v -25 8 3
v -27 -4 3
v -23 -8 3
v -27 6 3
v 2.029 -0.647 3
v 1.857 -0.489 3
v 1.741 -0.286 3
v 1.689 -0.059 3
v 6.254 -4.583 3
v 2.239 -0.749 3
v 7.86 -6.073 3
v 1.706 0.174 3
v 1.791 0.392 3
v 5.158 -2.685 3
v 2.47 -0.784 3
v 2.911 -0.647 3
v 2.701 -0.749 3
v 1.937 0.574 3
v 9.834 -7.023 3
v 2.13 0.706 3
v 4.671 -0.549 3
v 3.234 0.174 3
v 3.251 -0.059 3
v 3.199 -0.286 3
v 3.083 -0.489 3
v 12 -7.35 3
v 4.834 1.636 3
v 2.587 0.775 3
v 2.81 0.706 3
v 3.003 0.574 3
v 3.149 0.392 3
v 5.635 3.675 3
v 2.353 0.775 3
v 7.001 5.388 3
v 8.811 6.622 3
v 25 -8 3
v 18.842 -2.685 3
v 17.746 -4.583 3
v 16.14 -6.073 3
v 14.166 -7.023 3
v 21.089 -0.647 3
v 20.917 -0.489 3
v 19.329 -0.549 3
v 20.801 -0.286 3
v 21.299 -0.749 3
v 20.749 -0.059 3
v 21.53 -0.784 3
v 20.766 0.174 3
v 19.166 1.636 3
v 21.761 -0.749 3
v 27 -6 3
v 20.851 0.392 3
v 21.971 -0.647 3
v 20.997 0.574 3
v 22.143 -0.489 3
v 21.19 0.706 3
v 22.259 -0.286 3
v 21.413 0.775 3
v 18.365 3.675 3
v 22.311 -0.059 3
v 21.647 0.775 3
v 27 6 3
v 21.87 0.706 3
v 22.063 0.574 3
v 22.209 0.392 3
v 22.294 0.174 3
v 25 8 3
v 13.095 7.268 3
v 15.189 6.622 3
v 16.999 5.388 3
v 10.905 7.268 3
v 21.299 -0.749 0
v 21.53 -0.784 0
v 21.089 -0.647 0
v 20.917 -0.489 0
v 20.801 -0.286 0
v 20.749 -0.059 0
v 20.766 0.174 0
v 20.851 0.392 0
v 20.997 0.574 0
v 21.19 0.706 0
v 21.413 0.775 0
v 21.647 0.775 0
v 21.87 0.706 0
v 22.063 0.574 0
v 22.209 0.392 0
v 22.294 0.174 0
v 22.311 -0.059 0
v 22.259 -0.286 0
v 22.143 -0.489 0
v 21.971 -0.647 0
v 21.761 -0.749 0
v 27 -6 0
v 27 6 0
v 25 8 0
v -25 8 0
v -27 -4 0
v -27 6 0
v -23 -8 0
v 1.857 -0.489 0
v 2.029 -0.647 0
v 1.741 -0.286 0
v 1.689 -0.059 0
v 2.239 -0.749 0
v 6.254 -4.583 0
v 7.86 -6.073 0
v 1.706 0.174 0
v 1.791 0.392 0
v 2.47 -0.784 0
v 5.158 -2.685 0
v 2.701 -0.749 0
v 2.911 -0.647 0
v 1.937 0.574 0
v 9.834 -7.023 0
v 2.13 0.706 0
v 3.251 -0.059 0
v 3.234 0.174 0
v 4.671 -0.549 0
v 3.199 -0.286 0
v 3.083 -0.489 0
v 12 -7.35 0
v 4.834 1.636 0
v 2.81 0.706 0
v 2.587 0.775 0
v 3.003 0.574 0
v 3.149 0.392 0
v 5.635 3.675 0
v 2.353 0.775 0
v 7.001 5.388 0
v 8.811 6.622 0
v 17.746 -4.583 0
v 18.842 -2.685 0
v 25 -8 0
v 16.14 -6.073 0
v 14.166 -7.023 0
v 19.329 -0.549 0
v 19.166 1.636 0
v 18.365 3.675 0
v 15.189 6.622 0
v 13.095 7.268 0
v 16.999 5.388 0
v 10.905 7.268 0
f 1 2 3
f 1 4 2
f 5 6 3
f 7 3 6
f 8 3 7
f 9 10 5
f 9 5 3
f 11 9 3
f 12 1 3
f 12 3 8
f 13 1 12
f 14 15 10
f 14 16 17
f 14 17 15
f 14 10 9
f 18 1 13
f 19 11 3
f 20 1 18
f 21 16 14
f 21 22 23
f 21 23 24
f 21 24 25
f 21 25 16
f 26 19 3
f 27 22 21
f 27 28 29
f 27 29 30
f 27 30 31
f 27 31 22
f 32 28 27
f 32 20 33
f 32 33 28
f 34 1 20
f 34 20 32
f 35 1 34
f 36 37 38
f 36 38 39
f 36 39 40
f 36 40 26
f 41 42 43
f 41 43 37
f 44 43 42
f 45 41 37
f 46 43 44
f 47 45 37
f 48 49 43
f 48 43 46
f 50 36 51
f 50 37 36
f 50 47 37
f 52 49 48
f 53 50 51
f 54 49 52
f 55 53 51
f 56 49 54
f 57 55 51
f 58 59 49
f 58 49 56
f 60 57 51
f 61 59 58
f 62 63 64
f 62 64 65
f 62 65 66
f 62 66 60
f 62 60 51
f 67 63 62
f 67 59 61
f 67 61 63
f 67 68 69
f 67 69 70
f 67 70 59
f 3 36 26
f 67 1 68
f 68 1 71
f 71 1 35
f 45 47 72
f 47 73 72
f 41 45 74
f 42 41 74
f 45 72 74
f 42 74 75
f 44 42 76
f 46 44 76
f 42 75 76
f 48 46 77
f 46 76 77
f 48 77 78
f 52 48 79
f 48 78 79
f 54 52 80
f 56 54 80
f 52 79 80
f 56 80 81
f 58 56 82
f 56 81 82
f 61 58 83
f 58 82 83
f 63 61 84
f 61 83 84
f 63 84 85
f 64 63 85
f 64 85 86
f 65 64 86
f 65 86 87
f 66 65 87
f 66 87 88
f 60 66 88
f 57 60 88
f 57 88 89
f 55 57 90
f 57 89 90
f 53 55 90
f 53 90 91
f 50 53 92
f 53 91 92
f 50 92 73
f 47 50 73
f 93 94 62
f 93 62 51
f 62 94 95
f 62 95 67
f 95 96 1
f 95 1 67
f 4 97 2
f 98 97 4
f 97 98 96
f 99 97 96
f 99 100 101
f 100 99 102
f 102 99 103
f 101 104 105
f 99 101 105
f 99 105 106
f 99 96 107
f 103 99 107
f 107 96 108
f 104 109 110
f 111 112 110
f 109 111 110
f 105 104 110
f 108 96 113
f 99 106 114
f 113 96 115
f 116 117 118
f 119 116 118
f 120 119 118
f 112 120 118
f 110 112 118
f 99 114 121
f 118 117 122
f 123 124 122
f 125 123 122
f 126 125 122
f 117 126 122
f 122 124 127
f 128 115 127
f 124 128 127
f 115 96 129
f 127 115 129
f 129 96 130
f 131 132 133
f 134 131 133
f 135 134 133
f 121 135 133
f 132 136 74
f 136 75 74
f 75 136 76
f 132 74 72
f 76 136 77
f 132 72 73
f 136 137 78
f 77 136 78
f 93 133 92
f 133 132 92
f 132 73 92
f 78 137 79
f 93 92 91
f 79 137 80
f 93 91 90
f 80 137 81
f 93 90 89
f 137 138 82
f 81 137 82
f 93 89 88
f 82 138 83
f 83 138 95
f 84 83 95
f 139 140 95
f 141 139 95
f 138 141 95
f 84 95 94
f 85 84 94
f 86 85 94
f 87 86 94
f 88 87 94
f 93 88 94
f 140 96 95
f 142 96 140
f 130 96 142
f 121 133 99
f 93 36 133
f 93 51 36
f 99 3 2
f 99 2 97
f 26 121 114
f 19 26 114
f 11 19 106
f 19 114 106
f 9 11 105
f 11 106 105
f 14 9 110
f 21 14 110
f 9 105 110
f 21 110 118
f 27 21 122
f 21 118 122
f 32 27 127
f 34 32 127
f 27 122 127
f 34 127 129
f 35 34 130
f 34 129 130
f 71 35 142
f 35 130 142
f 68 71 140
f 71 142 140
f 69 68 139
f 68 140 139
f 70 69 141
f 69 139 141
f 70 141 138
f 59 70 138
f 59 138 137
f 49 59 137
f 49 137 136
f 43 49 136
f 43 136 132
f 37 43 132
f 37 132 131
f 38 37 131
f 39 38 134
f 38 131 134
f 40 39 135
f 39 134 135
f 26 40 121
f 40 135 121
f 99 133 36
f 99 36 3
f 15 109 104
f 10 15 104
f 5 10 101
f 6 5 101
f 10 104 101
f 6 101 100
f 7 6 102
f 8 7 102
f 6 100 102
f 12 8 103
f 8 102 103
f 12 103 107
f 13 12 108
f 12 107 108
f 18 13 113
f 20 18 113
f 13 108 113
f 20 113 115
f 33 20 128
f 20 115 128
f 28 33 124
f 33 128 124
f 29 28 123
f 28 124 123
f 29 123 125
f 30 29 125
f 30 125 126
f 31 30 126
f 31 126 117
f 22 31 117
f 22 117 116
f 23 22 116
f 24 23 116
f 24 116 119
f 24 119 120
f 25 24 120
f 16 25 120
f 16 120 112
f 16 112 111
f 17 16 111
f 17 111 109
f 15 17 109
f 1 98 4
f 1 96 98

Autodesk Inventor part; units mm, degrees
ref_plane "YZ Plane" through (0, 0, 0) normal (1, 0, 0) x (0, 1, 0)
ref_plane "XZ Plane" through (0, 0, 0) normal (0, 1, 0) x (-1, 0, 0)
ref_plane "XY Plane" through (0, 0, 0) normal (0, 0, 1) x (1, 0, 0)
sketch "Sketch1" plane through (0, 0, 0) normal (0, 0, 1) x (1, 0, 0)
  line L0 (-37.8, 0) -> (37.8, 0) projected
  line L1 (0, -11.2) -> (0, 11.2) projected
  line L2 (-27, 8) -> (27, 8)
  line L3 (27, 8) -> (27, -8)
  line L4 (27, -8) -> (-27, -8)
  line L5 (-27, -8) -> (-27, 8)
  point P0 (0, 0)
  point P1 (0, 8)
  point P2 (27, 0)
  dimension "d0" = 54
  dimension "d1" = 16
extrude "Extrusion1" add sketch "Sketch1" along normal blind 3
sketch "Sketch2" plane through (0, 0, 3) normal (0, 0, 1) x (1, 0, 0)
  line L0 (-37.8, 0) -> (37.8, 0) construction
  line L1 (0, -11.2) -> (0, 11.2) construction
  point P0 (0, 0)
  point P1 (12, 0)
  dimension "d4" = 12
hole "Hole1" at (12, 0, 3) direction (0, 0, -1) diameter 14.7 end through all
chamfer "Chamfer2" distance 2 angle 45 3 edges at (-27, 8, 1.5) (27, 8, 1.5) (27, -8, 1.5)
chamfer "Chamfer3" distance 4 angle 45 1 edges at (-27, -8, 1.5)
sketch "Sketch3" plane through (0, 0, 3) normal (0, 0, 1) x (1, 0, 0)
  line L0 (-37.8, 0) -> (37.8, 0) projected
  line L1 (0, -11.2) -> (0, 11.2) projected
  circle A0 centre (12, 0) radius 7.35 projected
  point P0 (0, 0)
  point P1 (2.47, 0)
  point P2 (21.53, 0)
  dimension "d21" = 9.53
  dimension "d22" = 9.53
hole "Hole2" at (2.47, 0, 3) at (21.53, 0, 3) direction (0, 0, -1) diameter 1.567 end through all thread size "M2x0.4" class "6H" standard "ISO Metric profile"
equation "\"d22\" = d21"
properties part number "P126" material "Aluminium"
